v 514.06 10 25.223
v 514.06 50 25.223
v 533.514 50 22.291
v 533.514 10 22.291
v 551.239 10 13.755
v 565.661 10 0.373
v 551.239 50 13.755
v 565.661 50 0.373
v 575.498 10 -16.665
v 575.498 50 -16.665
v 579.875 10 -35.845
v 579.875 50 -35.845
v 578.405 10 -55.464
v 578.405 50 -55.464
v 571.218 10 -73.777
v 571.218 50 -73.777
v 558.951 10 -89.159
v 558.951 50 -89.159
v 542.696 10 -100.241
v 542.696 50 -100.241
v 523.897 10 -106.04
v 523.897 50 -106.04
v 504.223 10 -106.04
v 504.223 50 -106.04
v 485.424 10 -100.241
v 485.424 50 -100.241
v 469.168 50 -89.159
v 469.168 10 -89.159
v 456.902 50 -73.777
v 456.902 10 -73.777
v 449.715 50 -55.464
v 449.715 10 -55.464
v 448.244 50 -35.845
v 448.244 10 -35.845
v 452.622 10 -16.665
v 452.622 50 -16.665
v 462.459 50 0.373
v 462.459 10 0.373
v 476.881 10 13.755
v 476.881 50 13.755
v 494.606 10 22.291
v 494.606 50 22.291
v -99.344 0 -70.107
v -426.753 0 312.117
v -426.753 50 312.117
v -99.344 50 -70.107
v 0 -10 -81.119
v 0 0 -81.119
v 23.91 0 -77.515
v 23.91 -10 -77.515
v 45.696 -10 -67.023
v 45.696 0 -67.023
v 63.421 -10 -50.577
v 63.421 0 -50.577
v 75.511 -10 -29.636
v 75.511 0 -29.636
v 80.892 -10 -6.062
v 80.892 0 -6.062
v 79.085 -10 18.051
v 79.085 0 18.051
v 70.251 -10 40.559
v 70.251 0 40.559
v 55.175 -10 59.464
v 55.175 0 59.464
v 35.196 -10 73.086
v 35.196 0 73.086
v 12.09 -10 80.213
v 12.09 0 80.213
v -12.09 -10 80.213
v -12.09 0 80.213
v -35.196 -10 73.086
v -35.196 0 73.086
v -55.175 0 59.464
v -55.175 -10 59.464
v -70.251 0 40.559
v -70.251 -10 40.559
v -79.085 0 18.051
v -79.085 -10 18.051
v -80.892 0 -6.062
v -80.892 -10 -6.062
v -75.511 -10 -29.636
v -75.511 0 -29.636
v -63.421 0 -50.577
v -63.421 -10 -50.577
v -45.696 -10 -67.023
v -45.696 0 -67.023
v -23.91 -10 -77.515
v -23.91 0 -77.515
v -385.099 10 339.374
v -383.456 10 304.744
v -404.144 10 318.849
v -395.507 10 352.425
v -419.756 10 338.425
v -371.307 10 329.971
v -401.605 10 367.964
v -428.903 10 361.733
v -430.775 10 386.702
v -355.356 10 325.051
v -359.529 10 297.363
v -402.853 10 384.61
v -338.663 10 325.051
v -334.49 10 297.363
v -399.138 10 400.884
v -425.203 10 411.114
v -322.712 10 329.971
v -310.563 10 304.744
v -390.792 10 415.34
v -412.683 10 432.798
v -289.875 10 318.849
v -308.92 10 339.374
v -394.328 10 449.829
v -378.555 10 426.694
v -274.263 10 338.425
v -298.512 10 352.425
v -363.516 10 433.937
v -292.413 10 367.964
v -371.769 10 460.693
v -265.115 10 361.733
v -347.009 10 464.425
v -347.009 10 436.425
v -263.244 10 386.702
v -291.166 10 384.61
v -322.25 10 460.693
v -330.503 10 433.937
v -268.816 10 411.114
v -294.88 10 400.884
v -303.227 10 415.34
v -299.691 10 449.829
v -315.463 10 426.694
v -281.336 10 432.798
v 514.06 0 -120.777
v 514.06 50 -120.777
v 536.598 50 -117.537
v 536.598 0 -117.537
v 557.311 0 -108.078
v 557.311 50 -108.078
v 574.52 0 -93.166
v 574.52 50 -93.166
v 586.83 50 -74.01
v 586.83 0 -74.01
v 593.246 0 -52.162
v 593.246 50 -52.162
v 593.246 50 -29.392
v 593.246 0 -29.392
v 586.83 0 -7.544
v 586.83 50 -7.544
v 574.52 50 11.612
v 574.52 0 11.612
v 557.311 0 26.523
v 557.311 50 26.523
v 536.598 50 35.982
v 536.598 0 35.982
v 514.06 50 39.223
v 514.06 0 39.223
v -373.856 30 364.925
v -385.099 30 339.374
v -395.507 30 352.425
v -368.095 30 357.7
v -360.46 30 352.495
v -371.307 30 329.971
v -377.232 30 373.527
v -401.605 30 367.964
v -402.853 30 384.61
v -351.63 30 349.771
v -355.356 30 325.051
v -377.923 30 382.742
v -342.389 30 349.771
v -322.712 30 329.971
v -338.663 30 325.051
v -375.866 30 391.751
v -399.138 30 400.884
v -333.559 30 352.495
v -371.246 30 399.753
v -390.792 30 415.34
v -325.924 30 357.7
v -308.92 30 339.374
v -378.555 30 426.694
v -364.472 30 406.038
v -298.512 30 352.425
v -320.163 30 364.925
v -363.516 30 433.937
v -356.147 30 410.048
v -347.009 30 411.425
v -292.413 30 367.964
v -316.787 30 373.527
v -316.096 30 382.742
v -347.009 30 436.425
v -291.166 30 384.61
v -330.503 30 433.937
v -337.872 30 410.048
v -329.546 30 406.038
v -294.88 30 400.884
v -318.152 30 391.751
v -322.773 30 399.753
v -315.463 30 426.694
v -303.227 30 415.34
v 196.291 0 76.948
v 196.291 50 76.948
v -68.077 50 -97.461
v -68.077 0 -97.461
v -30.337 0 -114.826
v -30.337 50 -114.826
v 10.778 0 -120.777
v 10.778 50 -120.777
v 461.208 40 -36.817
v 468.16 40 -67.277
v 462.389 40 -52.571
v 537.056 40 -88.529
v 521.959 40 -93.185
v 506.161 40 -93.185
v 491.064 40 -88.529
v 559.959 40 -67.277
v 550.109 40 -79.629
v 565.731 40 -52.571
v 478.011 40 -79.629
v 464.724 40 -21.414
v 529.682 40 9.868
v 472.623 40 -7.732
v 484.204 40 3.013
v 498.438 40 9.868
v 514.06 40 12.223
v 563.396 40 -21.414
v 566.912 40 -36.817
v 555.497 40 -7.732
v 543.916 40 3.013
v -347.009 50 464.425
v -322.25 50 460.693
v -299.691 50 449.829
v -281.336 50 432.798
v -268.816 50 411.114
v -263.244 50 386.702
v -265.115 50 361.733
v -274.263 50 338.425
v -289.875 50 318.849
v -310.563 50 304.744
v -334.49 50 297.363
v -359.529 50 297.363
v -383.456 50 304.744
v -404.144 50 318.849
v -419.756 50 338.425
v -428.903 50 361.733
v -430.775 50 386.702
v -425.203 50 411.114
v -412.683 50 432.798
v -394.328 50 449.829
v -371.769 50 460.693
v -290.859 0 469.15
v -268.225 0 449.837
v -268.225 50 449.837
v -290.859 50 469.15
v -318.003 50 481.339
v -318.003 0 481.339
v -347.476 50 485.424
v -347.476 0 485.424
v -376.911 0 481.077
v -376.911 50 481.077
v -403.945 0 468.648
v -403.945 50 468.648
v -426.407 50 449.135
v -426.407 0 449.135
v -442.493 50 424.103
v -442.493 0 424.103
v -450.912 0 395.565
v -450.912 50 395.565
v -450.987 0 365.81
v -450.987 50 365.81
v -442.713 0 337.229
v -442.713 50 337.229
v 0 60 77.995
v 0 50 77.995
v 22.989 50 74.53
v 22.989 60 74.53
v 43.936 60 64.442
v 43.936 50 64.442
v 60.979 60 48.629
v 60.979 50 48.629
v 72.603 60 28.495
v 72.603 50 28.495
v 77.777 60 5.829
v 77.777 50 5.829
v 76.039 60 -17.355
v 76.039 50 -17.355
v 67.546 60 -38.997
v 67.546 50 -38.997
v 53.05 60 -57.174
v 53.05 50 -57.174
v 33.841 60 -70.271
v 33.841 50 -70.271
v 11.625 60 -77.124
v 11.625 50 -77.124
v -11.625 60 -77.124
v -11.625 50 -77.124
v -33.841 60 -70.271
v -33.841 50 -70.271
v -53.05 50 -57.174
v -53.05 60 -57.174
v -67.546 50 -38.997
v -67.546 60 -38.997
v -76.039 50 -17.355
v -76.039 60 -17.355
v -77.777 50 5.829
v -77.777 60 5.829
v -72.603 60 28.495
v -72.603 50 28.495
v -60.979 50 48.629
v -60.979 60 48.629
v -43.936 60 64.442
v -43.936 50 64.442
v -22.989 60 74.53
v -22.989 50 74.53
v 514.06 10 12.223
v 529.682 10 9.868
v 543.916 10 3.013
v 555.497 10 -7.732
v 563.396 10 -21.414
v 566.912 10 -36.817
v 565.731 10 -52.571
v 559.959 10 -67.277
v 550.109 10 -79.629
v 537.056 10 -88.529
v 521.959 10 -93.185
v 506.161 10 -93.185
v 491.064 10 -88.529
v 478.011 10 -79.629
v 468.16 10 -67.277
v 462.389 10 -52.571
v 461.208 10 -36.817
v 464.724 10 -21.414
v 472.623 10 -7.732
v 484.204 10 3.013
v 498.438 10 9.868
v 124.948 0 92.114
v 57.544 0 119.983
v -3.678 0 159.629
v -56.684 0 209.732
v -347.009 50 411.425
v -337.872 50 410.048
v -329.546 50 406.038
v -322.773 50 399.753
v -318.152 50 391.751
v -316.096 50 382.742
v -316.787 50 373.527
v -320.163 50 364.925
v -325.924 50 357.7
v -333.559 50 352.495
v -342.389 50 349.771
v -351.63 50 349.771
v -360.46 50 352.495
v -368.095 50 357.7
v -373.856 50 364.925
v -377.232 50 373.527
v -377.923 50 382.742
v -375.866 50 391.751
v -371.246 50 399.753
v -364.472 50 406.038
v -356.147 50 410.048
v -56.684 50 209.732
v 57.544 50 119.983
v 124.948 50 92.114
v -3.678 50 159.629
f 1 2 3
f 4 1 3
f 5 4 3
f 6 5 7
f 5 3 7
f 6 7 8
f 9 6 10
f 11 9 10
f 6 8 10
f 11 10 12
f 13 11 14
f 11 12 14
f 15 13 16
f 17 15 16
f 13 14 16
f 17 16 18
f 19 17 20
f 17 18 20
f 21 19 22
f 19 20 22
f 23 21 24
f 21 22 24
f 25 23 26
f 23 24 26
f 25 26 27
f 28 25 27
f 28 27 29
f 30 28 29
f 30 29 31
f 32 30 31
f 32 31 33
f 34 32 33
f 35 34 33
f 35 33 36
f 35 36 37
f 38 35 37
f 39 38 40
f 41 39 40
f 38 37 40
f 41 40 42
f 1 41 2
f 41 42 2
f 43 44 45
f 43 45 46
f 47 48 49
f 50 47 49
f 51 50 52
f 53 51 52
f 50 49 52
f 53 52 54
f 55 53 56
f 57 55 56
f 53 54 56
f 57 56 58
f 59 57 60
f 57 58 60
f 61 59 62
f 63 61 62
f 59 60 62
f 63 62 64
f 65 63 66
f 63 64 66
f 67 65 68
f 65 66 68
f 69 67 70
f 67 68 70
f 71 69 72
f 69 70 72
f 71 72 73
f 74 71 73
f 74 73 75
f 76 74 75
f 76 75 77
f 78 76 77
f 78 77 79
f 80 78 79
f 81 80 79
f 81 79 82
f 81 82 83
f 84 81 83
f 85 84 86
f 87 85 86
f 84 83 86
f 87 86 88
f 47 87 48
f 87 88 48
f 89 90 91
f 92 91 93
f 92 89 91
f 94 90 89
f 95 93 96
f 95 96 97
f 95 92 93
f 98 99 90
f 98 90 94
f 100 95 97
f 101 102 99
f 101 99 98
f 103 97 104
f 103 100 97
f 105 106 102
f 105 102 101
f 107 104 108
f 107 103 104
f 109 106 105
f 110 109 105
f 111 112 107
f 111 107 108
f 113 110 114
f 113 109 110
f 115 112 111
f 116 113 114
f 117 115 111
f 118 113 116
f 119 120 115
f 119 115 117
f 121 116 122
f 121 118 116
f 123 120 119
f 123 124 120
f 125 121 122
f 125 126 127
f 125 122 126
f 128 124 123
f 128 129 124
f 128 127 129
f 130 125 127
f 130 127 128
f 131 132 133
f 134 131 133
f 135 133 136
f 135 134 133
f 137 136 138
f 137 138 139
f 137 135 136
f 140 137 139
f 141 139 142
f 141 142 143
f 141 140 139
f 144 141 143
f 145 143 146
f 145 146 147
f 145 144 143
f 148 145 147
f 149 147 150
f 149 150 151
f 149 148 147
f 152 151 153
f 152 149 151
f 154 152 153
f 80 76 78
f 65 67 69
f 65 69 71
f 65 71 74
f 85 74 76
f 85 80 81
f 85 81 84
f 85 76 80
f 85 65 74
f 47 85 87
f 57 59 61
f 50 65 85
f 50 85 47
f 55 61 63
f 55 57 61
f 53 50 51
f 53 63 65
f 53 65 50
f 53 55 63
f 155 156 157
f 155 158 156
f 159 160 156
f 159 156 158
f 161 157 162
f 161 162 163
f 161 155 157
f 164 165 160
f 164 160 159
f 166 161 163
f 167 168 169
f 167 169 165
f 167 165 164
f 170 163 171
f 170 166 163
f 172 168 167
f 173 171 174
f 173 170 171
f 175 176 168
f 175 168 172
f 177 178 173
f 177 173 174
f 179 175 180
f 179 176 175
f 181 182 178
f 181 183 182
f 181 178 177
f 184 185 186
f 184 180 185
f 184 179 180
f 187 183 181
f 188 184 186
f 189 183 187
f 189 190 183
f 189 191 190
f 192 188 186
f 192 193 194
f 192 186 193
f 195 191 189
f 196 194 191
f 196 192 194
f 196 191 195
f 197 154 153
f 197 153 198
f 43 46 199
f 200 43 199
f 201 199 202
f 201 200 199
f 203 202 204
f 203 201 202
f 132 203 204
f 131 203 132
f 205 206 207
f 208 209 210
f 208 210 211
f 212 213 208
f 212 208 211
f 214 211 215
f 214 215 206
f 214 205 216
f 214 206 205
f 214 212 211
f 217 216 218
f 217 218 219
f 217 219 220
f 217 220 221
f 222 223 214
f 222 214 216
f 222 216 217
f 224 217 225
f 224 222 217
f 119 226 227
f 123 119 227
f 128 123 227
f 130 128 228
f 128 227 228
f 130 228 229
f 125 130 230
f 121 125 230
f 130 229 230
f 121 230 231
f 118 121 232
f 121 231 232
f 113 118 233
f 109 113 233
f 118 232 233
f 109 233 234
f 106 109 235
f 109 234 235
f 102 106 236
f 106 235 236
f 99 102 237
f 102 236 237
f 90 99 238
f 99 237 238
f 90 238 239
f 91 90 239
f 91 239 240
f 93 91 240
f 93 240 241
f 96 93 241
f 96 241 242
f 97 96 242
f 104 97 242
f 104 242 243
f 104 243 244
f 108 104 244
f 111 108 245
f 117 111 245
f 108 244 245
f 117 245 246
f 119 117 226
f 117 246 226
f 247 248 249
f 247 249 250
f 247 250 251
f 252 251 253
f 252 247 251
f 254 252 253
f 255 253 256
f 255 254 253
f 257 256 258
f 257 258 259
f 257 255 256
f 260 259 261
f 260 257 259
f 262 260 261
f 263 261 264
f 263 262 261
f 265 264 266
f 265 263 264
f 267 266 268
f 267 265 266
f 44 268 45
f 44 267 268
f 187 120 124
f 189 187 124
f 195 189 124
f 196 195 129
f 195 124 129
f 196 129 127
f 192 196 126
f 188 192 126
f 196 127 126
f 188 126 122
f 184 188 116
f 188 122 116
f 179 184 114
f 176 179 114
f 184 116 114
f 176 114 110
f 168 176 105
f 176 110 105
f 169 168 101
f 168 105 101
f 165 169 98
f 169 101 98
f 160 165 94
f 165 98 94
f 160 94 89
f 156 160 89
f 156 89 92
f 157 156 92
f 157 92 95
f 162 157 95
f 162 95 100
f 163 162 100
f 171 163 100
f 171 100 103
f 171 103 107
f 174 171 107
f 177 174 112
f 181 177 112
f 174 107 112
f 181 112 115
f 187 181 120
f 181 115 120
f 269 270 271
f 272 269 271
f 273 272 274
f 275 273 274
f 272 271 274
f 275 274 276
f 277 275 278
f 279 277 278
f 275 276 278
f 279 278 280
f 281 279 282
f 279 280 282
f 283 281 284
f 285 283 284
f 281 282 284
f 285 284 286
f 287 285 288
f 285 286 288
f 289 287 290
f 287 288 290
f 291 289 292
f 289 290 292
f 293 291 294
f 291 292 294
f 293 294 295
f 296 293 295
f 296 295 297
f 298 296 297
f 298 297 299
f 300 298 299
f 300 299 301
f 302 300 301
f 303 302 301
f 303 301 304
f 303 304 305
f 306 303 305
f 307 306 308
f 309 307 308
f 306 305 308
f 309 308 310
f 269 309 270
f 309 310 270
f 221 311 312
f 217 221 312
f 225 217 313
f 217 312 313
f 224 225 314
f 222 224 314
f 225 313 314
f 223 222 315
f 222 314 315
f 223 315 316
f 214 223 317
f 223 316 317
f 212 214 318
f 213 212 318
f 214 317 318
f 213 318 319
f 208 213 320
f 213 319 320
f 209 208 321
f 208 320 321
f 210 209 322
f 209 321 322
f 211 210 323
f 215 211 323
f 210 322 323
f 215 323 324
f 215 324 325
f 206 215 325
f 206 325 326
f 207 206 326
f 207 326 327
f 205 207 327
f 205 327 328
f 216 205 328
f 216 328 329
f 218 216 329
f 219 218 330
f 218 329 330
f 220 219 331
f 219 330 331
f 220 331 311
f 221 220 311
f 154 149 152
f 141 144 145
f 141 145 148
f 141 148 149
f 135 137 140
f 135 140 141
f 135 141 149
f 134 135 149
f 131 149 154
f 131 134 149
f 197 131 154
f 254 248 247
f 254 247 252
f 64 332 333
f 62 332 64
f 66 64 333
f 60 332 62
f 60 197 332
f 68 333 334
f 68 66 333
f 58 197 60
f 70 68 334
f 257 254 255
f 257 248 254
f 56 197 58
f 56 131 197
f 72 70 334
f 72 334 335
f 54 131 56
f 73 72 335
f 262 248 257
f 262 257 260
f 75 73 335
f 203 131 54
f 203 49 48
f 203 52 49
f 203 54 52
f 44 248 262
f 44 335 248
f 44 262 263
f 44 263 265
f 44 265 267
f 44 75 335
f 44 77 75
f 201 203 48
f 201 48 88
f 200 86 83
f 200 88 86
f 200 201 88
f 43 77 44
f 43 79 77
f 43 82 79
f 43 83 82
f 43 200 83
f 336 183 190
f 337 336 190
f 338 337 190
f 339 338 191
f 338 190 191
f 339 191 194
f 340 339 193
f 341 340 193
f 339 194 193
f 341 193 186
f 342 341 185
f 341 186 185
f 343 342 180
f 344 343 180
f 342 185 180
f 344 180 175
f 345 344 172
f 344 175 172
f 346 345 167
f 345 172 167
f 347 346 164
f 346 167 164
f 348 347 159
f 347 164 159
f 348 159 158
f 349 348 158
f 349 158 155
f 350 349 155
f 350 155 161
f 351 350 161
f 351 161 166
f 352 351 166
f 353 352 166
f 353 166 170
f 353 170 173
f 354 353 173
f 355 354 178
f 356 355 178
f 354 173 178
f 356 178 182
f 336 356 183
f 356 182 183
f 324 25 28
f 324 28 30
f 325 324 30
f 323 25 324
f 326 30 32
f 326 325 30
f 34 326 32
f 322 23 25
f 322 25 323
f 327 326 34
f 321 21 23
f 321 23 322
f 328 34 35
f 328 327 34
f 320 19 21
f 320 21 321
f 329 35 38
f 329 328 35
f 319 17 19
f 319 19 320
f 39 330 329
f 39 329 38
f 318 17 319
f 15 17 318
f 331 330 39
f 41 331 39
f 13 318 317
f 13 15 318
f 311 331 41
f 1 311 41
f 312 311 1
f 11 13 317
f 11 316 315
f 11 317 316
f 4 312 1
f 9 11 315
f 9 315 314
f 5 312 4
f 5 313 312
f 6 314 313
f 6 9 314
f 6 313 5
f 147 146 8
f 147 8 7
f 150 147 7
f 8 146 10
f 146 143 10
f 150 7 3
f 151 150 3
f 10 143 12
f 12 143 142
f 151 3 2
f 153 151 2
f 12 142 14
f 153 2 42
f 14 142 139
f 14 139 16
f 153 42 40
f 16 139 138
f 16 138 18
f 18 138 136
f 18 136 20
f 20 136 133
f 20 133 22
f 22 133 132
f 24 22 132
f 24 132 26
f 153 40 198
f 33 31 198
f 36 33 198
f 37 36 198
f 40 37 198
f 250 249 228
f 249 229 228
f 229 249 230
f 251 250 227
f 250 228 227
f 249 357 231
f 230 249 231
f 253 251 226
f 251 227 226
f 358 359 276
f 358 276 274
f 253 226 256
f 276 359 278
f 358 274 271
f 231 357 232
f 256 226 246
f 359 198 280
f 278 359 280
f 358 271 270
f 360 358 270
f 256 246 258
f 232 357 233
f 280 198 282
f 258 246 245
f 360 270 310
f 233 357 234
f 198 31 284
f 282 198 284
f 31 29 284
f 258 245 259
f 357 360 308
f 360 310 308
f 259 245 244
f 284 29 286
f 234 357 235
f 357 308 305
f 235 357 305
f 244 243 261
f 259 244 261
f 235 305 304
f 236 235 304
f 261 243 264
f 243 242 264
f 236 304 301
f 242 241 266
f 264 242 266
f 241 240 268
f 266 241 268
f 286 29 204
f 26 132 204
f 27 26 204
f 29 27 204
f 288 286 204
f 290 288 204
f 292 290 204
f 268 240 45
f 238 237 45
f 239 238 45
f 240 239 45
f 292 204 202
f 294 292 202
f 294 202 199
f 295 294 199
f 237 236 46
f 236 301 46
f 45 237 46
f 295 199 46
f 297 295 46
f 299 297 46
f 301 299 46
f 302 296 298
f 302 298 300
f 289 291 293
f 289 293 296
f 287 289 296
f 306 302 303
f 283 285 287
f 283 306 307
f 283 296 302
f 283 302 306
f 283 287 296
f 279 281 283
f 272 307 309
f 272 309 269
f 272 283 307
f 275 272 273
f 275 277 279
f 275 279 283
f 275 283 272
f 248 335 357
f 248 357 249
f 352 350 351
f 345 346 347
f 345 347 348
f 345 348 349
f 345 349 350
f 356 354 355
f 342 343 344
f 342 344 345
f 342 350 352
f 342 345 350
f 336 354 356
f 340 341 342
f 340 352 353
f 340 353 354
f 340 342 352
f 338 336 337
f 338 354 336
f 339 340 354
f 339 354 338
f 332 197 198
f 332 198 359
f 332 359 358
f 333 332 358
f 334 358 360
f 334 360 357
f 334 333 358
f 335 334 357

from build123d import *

# Parameters (mm, degrees)
BOSS_EXTRUDE2_DEPTH = 50
SKETCH4_R           = 84
CUT_EXTRUDE1_DEPTH  = 40
SKETCH5_R           = 66
CUT_EXTRUDE2_DEPTH  = 40
SKETCH6_R           = 56
BOSS_EXTRUDE3_DEPTH = 20
SKETCH7_R           = 31
BOSS_EXTRUDE4_DEPTH = 20
SKETCH8_R           = 53
BOSS_EXTRUDE5_DEPTH = 30
SKETCH9_R           = 81.118790055
BOSS_EXTRUDE6_DEPTH = 10
SKETCH10_R          = 77.994904394
BOSS_EXTRUDE7_DEPTH = 10


with BuildPart() as part:
    # Sketch3 → Boss-Extrude2 (new body)
    with BuildSketch(Plane(origin=(0, 0, 0), x_dir=(1, 0, 0), z_dir=(0, 1, 0))):
        with BuildLine():
            Line((-426.753144047, -312.117374747), (-99.343882551, 70.106841813))
            ThreePointArc((-99.343882551, 70.106841813), (-49.831824853, 107.501926674), (10.778427661, 120.777224017))
            Line((10.778427661, 120.777224017), (514.059836256, 120.777224017))
            ThreePointArc((514.059836256, 120.777224017), (594.059836256, 40.777224017), (514.059836256, -39.222775983))
            Line((514.059836256, -39.222775983), (196.291302455, -76.947554654))
            ThreePointArc((196.291302455, -76.947554654), (57.544015582, -119.983155247), (-56.683941268, -209.731951378))
            Line((-56.683941268, -209.731951378), (-268.224957691, -449.836925027))
            ThreePointArc((-268.224957691, -449.836925027), (-415.870847806, -459.691045091), (-426.753144047, -312.117374747))
        make_face()
    extrude(amount=BOSS_EXTRUDE2_DEPTH)

    # Sketch4 → Cut-Extrude1 (cut)
    with BuildSketch(Plane(origin=(0, 50, 0), x_dir=(1, 0, 0), z_dir=(0, 1, 0))):
        with Locations(Location((-347.009402169, -380.425029013, 0), (0, 0, 270))):
            Circle(SKETCH4_R)
    extrude(amount=-CUT_EXTRUDE1_DEPTH, mode=Mode.SUBTRACT)

    # Sketch5 → Cut-Extrude2 (cut)
    with BuildSketch(Plane(origin=(0, 50, 0), x_dir=(1, 0, 0), z_dir=(0, 1, 0))):
        with Locations(Location((514.059836256, 40.777224017, 0), (0, 0, 270))):
            Circle(SKETCH5_R)
    extrude(amount=-CUT_EXTRUDE2_DEPTH, mode=Mode.SUBTRACT)

    # Sketch6 → Boss-Extrude3 (add)
    with BuildSketch(Plane(origin=(0, 10, 0), x_dir=(1, 0, 0), z_dir=(0, 1, 0))):
        with Locations(Location((-347.009402169, -380.425029013, 0), (0, 0, 270))):
            Circle(SKETCH6_R)
    extrude(amount=BOSS_EXTRUDE3_DEPTH)

    # Sketch7 → Boss-Extrude4 (add)
    with BuildSketch(Plane(origin=(0, 30, 0), x_dir=(1, 0, 0), z_dir=(0, 1, 0))):
        with Locations(Location((-347.009402169, -380.425029013, 0), (0, 0, 270))):
            Circle(SKETCH7_R)
    extrude(amount=BOSS_EXTRUDE4_DEPTH)

    # Sketch8 → Boss-Extrude5 (add)
    with BuildSketch(Plane(origin=(0, 10, 0), x_dir=(1, 0, 0), z_dir=(0, 1, 0))):
        with Locations(Location((514.059836256, 40.777224017, 0), (0, 0, 270))):
            Circle(SKETCH8_R)
    extrude(amount=BOSS_EXTRUDE5_DEPTH)

    # Sketch9 → Boss-Extrude6 (add)
    with BuildSketch(Plane.XZ):
        with Locations(Location((0, 0, 0), (0, 0, 270))):
            Circle(SKETCH9_R)
    extrude(amount=BOSS_EXTRUDE6_DEPTH)

    # Sketch10 → Boss-Extrude7 (add)
    with BuildSketch(Plane(origin=(0, 50, 0), x_dir=(1, 0, 0), z_dir=(0, 1, 0))):
        with Locations(Location((0, 0, 0), (0, 0, 270))):
            Circle(SKETCH10_R)
    extrude(amount=BOSS_EXTRUDE7_DEPTH)


solid = part.part
